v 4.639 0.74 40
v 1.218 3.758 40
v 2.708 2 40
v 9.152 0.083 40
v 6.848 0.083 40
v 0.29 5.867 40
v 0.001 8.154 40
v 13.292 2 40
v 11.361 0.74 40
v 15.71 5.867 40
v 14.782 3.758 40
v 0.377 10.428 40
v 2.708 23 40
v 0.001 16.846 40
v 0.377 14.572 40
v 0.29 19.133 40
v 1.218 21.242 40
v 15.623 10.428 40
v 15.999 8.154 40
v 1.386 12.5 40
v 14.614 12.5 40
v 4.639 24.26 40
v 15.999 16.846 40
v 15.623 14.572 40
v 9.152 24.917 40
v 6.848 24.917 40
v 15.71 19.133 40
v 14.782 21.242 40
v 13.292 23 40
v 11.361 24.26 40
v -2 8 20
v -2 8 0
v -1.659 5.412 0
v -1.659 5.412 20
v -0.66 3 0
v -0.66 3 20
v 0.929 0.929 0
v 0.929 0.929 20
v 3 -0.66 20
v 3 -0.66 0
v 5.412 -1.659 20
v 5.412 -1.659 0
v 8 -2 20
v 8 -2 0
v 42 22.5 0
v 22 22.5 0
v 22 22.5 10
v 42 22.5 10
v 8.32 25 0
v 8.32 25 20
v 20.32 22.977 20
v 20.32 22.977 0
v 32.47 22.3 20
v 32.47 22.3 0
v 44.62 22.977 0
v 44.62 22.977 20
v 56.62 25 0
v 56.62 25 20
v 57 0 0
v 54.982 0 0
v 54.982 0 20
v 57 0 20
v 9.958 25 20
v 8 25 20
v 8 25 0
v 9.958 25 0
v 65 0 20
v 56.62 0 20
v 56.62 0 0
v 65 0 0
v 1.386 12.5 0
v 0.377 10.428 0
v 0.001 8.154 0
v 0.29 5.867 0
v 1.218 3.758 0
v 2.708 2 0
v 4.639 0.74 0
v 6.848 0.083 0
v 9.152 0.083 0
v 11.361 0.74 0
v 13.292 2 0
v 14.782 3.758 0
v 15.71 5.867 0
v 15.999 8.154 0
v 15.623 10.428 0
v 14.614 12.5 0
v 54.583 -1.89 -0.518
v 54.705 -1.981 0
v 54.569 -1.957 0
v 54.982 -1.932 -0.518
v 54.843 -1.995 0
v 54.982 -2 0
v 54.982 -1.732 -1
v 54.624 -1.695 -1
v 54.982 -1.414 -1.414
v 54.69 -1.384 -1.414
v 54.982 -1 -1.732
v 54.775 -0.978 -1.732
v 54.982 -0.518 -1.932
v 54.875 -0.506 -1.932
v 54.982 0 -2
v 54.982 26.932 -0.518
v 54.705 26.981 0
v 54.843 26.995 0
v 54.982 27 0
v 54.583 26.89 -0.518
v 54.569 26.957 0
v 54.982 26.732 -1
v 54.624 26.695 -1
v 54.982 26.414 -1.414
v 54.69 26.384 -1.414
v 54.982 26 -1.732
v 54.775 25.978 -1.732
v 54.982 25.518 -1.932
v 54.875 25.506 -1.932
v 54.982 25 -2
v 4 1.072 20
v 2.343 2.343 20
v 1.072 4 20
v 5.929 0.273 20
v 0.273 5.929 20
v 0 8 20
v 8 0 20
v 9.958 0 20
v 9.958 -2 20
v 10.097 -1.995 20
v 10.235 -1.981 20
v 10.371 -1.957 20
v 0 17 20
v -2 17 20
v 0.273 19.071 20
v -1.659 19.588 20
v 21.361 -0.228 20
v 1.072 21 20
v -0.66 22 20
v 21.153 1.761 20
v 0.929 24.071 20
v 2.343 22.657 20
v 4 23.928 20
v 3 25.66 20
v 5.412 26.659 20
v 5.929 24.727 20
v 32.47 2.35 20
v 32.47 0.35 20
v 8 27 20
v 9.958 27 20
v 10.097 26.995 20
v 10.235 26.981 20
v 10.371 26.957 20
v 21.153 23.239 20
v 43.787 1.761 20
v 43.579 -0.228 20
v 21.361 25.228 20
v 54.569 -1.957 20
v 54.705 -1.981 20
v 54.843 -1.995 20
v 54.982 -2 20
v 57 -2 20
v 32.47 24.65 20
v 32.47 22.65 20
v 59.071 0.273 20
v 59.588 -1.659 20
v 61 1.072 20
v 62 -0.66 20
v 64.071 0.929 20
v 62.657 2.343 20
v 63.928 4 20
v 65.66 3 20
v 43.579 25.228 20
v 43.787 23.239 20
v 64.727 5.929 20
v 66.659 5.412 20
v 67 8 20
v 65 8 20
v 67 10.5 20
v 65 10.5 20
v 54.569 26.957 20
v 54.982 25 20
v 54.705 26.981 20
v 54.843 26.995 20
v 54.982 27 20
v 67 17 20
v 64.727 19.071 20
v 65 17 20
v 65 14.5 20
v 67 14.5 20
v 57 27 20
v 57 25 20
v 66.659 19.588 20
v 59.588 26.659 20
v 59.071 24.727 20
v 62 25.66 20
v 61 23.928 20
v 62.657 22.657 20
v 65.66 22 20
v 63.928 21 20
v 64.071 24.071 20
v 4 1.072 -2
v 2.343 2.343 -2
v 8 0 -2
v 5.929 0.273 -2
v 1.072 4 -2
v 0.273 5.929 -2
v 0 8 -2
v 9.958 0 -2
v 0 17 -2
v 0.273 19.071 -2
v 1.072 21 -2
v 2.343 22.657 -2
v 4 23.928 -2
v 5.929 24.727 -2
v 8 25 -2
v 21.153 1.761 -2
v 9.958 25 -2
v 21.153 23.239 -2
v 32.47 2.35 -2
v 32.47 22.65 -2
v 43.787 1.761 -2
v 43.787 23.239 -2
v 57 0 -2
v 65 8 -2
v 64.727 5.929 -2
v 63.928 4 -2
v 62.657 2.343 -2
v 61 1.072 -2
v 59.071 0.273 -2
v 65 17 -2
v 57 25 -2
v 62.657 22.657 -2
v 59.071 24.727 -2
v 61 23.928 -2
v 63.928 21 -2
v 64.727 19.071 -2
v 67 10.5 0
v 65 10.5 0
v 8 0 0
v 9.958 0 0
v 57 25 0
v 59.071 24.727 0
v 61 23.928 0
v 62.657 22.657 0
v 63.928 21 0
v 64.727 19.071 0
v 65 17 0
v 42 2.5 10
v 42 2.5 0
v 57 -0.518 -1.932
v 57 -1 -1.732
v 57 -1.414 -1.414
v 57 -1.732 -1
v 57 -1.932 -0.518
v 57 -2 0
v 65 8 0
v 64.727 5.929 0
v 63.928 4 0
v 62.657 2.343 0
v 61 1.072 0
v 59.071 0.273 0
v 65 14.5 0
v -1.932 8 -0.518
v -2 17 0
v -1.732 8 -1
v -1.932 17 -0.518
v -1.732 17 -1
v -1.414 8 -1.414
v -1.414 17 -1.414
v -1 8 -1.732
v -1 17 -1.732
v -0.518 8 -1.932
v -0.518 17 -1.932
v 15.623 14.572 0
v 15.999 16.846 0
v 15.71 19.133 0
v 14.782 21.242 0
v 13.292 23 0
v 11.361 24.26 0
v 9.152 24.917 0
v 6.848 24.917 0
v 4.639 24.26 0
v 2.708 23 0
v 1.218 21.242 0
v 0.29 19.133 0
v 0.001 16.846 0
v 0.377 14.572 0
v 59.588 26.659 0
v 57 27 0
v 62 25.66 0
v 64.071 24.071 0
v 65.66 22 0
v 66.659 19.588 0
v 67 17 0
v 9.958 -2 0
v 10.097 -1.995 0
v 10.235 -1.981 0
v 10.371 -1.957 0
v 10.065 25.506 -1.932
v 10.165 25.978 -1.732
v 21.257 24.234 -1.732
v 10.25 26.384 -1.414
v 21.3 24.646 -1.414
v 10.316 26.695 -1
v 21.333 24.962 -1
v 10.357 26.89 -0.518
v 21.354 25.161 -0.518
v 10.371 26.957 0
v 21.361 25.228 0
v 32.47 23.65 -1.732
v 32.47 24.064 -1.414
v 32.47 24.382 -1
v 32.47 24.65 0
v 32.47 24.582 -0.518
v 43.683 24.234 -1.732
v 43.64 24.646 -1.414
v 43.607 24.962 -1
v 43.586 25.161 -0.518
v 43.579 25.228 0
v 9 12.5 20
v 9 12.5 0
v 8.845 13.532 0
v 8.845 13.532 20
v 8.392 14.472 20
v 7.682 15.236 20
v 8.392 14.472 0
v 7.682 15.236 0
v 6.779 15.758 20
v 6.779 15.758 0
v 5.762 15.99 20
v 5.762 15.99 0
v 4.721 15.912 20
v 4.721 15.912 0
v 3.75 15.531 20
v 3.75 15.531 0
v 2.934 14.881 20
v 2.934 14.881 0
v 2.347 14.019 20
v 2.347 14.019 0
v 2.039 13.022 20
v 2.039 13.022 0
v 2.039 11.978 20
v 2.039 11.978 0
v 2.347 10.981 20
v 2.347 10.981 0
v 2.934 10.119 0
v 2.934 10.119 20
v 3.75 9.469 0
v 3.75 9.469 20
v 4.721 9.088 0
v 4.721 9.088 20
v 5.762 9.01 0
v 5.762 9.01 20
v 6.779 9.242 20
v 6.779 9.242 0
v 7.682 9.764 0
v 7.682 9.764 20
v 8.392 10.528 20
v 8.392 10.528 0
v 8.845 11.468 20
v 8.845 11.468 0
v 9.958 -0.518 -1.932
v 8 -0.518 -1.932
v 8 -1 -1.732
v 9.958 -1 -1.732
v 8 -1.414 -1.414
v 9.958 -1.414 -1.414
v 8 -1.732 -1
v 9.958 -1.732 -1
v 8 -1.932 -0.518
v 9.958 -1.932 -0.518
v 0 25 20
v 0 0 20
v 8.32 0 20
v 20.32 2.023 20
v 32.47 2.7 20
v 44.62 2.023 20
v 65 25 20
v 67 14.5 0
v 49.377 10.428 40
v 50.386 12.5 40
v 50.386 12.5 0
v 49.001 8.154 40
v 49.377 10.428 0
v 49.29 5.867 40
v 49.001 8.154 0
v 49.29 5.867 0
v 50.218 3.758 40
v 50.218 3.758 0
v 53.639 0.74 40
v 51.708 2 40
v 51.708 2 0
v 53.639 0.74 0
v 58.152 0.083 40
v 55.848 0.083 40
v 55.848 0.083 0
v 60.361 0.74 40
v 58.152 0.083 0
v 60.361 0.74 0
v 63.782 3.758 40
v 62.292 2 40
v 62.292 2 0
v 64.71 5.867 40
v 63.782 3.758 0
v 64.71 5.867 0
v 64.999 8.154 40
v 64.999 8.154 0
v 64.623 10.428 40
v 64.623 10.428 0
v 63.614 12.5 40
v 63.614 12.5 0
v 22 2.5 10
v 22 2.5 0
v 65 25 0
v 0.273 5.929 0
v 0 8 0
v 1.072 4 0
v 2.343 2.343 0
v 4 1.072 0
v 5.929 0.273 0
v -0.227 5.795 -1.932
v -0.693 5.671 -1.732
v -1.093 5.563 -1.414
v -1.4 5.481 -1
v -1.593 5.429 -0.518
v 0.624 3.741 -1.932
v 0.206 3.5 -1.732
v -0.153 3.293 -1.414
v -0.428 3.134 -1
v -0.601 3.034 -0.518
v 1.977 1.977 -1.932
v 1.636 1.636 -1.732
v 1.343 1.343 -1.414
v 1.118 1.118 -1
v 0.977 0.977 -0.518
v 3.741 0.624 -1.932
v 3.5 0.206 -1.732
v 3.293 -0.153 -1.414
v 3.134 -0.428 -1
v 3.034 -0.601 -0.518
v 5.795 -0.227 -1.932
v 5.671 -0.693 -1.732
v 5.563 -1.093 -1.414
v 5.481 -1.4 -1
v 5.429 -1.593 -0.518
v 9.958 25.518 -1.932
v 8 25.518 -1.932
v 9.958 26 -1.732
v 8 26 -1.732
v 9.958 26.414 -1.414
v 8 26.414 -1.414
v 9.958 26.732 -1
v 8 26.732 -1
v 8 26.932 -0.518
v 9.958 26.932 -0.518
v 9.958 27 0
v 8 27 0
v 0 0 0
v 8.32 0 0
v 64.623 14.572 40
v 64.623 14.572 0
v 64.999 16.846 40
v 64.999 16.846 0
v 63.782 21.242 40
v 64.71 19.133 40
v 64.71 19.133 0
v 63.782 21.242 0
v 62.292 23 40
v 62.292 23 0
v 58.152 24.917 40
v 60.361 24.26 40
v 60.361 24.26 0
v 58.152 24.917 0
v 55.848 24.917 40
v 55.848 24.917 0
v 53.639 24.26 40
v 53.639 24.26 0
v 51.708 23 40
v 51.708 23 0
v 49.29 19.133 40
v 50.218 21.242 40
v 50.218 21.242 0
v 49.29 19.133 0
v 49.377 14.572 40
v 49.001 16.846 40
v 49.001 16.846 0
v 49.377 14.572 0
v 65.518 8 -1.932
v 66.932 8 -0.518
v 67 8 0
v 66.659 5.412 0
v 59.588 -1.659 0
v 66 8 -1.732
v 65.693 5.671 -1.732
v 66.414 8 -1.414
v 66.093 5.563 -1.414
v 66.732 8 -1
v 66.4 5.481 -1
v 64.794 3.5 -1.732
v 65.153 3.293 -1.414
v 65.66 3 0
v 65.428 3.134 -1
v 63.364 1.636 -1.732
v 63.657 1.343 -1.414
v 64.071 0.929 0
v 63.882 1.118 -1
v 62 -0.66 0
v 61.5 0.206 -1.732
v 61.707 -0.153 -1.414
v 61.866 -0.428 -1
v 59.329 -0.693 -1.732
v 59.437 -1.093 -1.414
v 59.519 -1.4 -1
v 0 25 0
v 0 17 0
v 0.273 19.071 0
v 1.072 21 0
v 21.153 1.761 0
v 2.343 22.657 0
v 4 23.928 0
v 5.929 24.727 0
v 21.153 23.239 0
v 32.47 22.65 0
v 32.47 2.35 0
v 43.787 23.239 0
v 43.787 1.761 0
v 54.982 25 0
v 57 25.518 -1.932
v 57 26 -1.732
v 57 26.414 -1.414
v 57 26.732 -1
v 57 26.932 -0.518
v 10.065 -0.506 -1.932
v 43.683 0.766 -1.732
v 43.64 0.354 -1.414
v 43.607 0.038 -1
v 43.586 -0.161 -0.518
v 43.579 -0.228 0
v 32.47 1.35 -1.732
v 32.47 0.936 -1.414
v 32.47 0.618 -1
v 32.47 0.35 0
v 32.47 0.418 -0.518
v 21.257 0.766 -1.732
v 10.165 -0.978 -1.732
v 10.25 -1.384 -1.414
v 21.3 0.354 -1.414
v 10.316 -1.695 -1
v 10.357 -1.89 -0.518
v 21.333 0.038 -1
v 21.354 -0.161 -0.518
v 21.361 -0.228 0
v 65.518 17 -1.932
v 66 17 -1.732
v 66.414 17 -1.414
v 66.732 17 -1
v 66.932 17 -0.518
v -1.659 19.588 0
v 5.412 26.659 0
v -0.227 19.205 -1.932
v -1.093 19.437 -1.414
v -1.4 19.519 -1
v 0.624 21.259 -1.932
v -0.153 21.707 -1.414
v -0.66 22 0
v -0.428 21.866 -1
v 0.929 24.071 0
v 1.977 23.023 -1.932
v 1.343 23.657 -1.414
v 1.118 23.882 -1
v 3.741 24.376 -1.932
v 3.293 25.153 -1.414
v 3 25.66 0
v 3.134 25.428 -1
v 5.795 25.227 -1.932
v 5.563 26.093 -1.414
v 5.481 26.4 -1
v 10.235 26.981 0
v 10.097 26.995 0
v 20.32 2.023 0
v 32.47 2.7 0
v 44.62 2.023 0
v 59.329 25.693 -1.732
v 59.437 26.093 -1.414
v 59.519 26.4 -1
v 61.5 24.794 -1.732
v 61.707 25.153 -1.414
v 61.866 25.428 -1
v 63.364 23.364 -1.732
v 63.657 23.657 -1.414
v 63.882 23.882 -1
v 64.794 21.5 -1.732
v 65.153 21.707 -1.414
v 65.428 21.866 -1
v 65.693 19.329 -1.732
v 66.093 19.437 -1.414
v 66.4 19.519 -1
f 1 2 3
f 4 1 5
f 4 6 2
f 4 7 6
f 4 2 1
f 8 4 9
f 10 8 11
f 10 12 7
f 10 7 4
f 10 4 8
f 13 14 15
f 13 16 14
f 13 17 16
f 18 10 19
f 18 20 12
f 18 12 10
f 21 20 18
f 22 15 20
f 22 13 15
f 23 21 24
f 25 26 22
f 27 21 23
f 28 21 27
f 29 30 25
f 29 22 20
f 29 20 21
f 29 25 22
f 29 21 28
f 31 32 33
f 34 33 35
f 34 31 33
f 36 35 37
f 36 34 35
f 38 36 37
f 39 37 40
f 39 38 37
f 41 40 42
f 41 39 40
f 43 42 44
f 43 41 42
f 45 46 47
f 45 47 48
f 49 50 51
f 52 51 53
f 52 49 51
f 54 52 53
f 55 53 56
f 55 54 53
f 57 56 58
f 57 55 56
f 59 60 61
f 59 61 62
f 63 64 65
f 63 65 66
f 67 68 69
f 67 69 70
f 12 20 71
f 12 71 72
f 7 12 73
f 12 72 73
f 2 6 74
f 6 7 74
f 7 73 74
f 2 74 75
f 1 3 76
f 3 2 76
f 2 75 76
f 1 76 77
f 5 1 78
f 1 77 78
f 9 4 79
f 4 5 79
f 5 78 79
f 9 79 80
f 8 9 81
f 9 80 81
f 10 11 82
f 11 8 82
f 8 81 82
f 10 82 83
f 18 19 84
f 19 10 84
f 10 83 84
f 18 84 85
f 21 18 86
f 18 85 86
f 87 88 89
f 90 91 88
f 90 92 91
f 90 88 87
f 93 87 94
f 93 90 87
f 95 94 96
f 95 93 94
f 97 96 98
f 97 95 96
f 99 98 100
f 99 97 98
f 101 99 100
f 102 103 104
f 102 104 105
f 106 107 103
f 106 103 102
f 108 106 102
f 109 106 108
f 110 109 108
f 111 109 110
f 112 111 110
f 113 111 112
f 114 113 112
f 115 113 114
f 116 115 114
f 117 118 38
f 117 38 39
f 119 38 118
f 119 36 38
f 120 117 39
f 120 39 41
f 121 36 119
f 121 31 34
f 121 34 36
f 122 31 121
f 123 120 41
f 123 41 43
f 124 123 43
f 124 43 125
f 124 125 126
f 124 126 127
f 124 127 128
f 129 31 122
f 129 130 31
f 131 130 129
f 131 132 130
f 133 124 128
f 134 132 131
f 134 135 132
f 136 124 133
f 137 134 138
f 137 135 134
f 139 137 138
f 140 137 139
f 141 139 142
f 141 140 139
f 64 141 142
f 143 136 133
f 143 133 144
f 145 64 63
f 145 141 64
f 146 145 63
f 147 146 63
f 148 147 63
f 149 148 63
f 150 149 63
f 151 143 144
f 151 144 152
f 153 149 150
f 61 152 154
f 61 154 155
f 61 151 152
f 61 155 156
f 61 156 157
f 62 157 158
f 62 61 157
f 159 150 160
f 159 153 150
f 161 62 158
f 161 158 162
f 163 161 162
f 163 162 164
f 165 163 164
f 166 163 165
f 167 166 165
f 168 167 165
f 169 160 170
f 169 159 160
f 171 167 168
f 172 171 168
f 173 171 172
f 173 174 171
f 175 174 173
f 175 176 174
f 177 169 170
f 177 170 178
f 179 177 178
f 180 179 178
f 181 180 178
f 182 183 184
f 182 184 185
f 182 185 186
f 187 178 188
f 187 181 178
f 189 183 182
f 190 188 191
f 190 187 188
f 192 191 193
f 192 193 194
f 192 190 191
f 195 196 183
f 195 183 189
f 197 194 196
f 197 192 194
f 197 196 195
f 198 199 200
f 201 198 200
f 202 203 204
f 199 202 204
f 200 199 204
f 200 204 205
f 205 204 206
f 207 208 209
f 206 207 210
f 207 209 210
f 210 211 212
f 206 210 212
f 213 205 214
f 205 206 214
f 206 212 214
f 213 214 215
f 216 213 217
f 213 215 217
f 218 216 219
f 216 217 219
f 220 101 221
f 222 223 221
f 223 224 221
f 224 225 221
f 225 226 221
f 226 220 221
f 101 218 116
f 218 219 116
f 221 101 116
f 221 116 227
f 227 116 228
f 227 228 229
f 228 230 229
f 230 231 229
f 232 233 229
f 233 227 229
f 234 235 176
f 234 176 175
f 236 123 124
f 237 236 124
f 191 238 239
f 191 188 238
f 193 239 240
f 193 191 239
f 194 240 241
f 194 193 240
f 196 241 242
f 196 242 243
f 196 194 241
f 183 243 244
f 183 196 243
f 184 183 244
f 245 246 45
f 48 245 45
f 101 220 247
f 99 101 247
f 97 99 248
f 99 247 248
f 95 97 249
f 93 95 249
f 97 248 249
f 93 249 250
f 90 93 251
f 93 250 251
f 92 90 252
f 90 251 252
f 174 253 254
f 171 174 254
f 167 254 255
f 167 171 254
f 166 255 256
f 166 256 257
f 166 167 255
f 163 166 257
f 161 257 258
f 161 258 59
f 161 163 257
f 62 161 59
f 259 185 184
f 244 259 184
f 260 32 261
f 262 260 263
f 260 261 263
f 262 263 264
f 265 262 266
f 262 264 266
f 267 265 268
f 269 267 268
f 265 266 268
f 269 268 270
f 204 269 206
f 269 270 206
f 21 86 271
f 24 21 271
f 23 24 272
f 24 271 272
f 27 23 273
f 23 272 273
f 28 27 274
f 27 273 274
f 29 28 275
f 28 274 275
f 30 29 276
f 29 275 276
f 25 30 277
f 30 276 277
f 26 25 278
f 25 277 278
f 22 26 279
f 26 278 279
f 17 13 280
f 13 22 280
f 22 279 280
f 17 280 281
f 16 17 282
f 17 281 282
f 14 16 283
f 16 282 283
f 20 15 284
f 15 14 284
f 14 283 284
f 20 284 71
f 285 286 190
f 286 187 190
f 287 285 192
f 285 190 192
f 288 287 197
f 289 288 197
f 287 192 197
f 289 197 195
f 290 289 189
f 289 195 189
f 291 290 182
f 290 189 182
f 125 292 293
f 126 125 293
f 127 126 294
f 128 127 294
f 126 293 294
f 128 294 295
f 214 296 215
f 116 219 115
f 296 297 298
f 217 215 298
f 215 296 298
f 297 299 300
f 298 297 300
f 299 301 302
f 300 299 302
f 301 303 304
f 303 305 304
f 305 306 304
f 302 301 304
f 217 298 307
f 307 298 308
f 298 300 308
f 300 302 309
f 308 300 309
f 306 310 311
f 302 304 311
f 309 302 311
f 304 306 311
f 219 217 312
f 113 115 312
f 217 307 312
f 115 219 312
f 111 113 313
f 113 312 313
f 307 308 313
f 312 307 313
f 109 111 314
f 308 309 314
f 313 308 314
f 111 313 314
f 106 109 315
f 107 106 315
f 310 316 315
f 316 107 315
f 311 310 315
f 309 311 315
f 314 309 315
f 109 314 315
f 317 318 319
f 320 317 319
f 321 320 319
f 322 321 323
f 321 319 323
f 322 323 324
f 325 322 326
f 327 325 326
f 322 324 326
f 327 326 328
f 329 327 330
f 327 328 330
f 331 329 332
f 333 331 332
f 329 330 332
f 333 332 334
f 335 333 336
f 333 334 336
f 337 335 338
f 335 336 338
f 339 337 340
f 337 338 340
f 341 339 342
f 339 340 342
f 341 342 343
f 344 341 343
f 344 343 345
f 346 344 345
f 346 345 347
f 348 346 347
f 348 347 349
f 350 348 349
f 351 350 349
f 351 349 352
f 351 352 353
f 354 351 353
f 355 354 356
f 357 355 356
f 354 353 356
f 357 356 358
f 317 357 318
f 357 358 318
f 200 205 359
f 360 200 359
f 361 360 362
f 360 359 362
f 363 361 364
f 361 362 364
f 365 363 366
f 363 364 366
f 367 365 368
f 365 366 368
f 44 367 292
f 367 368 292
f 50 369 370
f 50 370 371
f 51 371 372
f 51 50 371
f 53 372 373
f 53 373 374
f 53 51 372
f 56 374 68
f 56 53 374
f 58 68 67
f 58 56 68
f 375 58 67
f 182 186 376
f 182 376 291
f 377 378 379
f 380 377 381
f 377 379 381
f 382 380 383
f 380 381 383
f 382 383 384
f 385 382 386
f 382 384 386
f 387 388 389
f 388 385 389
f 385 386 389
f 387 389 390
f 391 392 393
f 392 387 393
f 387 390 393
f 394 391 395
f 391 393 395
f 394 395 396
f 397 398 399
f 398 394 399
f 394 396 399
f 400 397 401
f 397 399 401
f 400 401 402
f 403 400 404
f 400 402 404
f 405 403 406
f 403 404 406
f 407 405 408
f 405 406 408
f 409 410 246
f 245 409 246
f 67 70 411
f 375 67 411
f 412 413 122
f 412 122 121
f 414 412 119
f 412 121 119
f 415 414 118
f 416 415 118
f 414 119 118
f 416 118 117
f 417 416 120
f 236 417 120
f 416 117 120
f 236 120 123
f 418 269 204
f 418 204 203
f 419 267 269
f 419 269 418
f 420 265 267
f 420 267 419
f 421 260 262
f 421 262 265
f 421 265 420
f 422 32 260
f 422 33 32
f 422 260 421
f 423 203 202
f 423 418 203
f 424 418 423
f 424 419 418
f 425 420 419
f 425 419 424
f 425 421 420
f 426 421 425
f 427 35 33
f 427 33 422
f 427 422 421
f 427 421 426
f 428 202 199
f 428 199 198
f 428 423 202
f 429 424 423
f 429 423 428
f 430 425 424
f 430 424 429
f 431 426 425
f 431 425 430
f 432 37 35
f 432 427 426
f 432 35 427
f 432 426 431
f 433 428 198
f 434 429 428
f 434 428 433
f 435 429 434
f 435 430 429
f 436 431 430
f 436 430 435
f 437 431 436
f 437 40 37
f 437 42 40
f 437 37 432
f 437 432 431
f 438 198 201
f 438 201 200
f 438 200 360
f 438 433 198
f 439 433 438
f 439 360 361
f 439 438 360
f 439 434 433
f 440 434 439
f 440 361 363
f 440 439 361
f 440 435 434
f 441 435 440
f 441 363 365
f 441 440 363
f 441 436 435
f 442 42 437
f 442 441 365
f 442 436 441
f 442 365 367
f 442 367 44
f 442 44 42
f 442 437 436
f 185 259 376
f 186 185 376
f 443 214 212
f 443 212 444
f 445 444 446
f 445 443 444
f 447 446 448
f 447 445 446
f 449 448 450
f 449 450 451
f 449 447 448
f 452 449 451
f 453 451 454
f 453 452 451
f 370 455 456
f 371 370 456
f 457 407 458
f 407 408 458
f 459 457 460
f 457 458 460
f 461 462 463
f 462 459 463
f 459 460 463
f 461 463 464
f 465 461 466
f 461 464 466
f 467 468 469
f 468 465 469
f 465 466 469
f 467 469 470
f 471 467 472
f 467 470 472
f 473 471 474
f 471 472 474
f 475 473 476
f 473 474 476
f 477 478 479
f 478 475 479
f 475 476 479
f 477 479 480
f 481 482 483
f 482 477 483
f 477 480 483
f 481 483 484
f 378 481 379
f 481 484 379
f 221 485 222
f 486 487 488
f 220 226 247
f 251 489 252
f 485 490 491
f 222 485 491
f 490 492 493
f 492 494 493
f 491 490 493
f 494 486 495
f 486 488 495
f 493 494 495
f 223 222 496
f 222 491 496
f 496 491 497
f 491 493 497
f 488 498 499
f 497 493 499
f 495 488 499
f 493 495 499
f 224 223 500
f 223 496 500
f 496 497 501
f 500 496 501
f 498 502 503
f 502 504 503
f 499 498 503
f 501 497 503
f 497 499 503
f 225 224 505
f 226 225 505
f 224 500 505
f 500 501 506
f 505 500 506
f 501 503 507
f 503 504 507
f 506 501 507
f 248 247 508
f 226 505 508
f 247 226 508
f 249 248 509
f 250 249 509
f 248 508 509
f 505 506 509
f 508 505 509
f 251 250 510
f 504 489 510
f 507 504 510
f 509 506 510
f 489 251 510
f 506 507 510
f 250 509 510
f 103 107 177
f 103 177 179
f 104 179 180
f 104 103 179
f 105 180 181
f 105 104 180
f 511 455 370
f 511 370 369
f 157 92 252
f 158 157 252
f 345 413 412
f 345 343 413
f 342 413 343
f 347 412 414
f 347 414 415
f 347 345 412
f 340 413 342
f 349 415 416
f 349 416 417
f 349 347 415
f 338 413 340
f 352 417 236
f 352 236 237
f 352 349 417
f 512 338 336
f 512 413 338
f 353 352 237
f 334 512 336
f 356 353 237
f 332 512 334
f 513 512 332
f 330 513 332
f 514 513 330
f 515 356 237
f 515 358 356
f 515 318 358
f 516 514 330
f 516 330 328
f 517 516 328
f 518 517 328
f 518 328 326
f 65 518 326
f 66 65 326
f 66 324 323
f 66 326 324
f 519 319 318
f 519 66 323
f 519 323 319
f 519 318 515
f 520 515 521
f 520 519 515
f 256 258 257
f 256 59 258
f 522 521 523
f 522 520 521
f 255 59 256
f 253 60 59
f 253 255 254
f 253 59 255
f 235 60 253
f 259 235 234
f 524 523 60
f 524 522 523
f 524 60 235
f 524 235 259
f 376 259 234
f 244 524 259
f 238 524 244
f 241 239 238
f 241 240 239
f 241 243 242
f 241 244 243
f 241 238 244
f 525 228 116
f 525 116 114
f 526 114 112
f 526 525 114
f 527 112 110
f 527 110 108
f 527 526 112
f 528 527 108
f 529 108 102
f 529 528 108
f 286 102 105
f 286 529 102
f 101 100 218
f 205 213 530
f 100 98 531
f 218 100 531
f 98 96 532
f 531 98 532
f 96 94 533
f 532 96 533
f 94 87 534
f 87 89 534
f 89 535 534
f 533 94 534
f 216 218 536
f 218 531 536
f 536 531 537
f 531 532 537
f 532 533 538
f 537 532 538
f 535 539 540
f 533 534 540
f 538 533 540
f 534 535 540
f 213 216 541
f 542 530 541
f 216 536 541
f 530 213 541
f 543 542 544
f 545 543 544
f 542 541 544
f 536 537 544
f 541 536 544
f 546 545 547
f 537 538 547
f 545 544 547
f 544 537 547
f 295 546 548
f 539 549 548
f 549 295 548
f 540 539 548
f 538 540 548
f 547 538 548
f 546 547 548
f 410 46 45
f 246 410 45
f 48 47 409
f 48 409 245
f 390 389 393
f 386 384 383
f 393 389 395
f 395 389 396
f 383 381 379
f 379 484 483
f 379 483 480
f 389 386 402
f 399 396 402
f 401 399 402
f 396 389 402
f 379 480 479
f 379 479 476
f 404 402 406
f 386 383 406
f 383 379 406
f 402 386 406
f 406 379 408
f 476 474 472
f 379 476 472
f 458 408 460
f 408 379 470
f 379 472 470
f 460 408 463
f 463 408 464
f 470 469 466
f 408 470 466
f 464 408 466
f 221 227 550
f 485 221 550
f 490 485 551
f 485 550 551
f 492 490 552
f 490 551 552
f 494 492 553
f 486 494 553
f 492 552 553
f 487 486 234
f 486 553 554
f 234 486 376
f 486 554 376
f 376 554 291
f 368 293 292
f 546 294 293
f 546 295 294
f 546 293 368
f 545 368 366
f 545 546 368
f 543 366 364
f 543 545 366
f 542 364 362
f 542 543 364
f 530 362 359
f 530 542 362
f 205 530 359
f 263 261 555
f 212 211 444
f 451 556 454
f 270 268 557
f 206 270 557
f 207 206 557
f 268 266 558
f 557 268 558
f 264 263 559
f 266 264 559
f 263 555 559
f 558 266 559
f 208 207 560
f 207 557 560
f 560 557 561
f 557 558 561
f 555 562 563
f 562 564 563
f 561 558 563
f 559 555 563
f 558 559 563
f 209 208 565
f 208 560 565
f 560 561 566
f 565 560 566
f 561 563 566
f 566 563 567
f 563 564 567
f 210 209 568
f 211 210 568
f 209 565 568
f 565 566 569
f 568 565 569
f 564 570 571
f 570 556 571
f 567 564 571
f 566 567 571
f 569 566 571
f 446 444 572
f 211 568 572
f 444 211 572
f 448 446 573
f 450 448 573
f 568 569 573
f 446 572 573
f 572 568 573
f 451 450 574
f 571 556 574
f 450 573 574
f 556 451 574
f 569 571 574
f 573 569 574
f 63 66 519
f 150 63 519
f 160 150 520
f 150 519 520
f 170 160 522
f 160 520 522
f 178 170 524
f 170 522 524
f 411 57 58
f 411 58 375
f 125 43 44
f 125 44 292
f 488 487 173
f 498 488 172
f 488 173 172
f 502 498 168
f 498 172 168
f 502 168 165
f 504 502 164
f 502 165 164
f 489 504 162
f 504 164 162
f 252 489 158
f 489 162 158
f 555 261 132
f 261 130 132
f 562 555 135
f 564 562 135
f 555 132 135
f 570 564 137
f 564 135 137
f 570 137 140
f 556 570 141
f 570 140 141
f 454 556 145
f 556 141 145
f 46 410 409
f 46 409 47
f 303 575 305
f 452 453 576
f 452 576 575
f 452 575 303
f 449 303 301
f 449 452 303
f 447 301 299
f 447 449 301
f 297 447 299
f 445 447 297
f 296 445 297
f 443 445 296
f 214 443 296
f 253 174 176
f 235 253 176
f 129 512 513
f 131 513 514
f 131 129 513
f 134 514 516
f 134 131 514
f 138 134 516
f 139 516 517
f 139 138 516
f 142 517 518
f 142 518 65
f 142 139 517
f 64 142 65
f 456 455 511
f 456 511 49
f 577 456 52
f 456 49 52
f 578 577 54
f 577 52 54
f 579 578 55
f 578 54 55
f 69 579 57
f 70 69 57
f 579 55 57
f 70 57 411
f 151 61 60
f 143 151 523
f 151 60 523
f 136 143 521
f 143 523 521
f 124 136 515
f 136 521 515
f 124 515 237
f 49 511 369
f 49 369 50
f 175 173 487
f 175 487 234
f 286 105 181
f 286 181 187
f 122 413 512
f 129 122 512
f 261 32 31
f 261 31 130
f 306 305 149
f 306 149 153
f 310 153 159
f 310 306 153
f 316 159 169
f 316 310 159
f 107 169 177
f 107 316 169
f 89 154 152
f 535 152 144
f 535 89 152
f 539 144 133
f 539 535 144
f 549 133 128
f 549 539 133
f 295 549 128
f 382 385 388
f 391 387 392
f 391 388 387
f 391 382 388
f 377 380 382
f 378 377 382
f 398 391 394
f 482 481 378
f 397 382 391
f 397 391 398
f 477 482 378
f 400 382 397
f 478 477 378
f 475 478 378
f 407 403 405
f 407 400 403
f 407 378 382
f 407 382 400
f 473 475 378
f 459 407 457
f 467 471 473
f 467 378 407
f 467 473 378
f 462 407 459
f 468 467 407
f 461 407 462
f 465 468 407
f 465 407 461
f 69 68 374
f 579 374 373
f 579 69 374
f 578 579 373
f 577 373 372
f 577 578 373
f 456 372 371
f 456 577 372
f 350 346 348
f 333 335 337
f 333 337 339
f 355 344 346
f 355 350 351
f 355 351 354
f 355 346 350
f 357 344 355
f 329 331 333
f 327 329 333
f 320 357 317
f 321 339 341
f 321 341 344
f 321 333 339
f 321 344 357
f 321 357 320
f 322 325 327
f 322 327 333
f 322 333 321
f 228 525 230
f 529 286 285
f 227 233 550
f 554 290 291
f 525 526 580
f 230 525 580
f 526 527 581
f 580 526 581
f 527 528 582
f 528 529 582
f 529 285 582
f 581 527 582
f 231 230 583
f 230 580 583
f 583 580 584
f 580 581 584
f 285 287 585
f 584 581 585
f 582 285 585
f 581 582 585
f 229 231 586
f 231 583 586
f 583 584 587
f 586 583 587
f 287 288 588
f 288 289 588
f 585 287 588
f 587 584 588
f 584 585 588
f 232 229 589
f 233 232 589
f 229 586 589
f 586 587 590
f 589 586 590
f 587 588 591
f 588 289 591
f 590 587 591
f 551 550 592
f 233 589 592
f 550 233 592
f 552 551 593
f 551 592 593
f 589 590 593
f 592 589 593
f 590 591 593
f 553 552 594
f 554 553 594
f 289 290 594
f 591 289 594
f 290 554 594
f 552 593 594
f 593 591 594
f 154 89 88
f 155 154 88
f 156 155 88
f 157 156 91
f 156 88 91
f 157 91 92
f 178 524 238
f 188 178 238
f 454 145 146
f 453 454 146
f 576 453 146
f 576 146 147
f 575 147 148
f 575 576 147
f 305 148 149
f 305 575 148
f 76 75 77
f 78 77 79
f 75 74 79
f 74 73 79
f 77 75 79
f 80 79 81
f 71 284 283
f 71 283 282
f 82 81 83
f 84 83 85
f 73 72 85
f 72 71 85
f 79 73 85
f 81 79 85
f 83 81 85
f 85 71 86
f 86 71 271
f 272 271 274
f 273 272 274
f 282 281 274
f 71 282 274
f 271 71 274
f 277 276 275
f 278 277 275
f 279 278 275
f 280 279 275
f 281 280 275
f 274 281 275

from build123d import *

# Parameters (mm, degrees)
CYLINDER001_R     = 8
CYLINDER001_DEPTH = 40
CYLINDER_R        = 8
CYLINDER_DEPTH    = 40
CYLINDER003_R     = 8
CYLINDER003_DEPTH = 40
CYLINDER002_R     = 8
CYLINDER002_DEPTH = 40
CYLINDER007_R     = 109.35
CYLINDER007_DEPTH = 40
CYLINDER006_R     = 109.35
CYLINDER006_DEPTH = 40
BOX001_W          = 65
BOX001_H          = 25
BOX001_DEPTH      = 20
BOX003_W          = 20
BOX003_H          = 20
BOX003_DEPTH      = 10
CYLINDER008_R     = 3.5
CYLINDER008_DEPTH = 20
BOX002_W          = 5
BOX002_H          = 4
BOX002_DEPTH      = 20
CYLINDER004_R     = 109
CYLINDER004_DEPTH = 40
CYLINDER005_R     = 109
CYLINDER005_DEPTH = 40
BOX_W             = 65
BOX_H             = 25
BOX_DEPTH         = 20
FILLET_R          = 8
THICKNESS_T       = 2


with BuildPart() as cilindro_alto_izq:
    # Cylinder001 → Cylinder001 (new body)
    with BuildSketch(Plane(origin=(8, 17, 0), x_dir=(1, 0, 0), z_dir=(0, 0, 1))):
        Circle(CYLINDER001_R)
    extrude(amount=CYLINDER001_DEPTH)


with BuildPart() as fusion_cilindros_izq:
    # Cylinder → Cylinder (new body)
    with BuildSketch(Plane(origin=(8, 8, 0), x_dir=(1, 0, 0), z_dir=(0, 0, 1))):
        Circle(CYLINDER_R)
    extrude(amount=CYLINDER_DEPTH)

    # Fusion: union Cilindro_alto_izq
    add(cilindro_alto_izq.part)


with BuildPart() as cilindro_baj_der:
    # Cylinder003 → Cylinder003 (new body)
    with BuildSketch(Plane(origin=(57, 8, 0), x_dir=(1, 0, 0), z_dir=(0, 0, 1))):
        Circle(CYLINDER003_R)
    extrude(amount=CYLINDER003_DEPTH)


with BuildPart() as fusion_cilindros_derec:
    # Cylinder002 → Cylinder002 (new body)
    with BuildSketch(Plane(origin=(57, 17, 0), x_dir=(1, 0, 0), z_dir=(0, 0, 1))):
        Circle(CYLINDER002_R)
    extrude(amount=CYLINDER002_DEPTH)

    # Fusion001: union Cilindro_baj_der
    add(cilindro_baj_der.part)


with BuildPart() as cilindro_bajo_grande001:
    # Cylinder007 → Cylinder007 (new body)
    with BuildSketch(Plane(origin=(32.47, -106.65, 0), x_dir=(1, 0, 0), z_dir=(0, 0, 1))):
        Circle(CYLINDER007_R)
    extrude(amount=CYLINDER007_DEPTH)


with BuildPart() as cilindro_alto_grande001:
    # Cylinder006 → Cylinder006 (new body)
    with BuildSketch(Plane(origin=(32.47, 131.65, 0), x_dir=(1, 0, 0), z_dir=(0, 0, 1))):
        Circle(CYLINDER006_R)
    extrude(amount=CYLINDER006_DEPTH)


with BuildPart() as diferencia_curvas_superior_e_inferior001:
    # Box001 → Box001 (new body)
    with BuildSketch(Plane.XY):
        with Locations((32.5, 12.5)):
            Rectangle(BOX001_W, BOX001_H)
    extrude(amount=BOX001_DEPTH)

    # Cut002: cut Cilindro_Alto_grande001
    add(cilindro_alto_grande001.part, mode=Mode.SUBTRACT)

    # Cut003: cut Cilindro_Bajo_grande001
    add(cilindro_bajo_grande001.part, mode=Mode.SUBTRACT)


with BuildPart() as referencia_interior:
    # Box003 → Box003 (new body)
    with BuildSketch(Plane(origin=(22, 2.5, 0), x_dir=(1, 0, 0), z_dir=(0, 0, 1))):
        with Locations((10, 10)):
            Rectangle(BOX003_W, BOX003_H)
    extrude(amount=BOX003_DEPTH)


with BuildPart() as cilindro:
    # Cylinder008 → Cylinder008 (new body)
    with BuildSketch(Plane(origin=(5.5, 12.5, 0), x_dir=(1, 0, 0), z_dir=(0, 0, 1))):
        Circle(CYLINDER008_R)
    extrude(amount=CYLINDER008_DEPTH)


with BuildPart() as ranura:
    # Box002 → Box002 (new body)
    with BuildSketch(Plane(origin=(65, 10.5, 0), x_dir=(1, 0, 0), z_dir=(0, 0, 1))):
        with Locations((2.5, 2)):
            Rectangle(BOX002_W, BOX002_H)
    extrude(amount=BOX002_DEPTH)


with BuildPart() as cilindro_bajo_grande:
    # Cylinder004 → Cylinder004 (new body)
    with BuildSketch(Plane(origin=(32.47, -106.65, 0), x_dir=(1, 0, 0), z_dir=(0, 0, 1))):
        Circle(CYLINDER004_R)
    extrude(amount=CYLINDER004_DEPTH)


with BuildPart() as cilindro_alto_grande:
    # Cylinder005 → Cylinder005 (new body)
    with BuildSketch(Plane(origin=(32.47, 131.65, 0), x_dir=(1, 0, 0), z_dir=(0, 0, 1))):
        Circle(CYLINDER005_R)
    extrude(amount=CYLINDER005_DEPTH)


with BuildPart() as final_con_cilindro:
    # Box → Box (new body)
    with BuildSketch(Plane.XY):
        with Locations((32.5, 12.5)):
            Rectangle(BOX_W, BOX_H)
    extrude(amount=BOX_DEPTH)

    # Cut: cut Cilindro_Alto_grande
    add(cilindro_alto_grande.part, mode=Mode.SUBTRACT)

    # Cut001: cut Cilindro_Bajo_grande
    add(cilindro_bajo_grande.part, mode=Mode.SUBTRACT)

    # Fillet
    fillet_edges = [final_con_cilindro.edges().sort_by_distance(p)[0] for p in [
        (0, 0, 10),
        (0, 25, 10),
        (65, 25, 10),
        (65, 0, 10),
    ]]
    fillet(fillet_edges, radius=FILLET_R)

    # Thickness
    thickness_openings = [final_con_cilindro.faces().sort_by_distance(p)[0] for p in [
        (32.502969, 12.5, 20),
    ]]
    offset(amount=THICKNESS_T, openings=thickness_openings)

    # Cut004: cut ranura
    add(ranura.part, mode=Mode.SUBTRACT)

    # Fusion002: union Cilindro
    add(cilindro.part)


solid = Compound([fusion_cilindros_izq.part, fusion_cilindros_derec.part, diferencia_curvas_superior_e_inferior001.part, referencia_interior.part, final_con_cilindro.part])
